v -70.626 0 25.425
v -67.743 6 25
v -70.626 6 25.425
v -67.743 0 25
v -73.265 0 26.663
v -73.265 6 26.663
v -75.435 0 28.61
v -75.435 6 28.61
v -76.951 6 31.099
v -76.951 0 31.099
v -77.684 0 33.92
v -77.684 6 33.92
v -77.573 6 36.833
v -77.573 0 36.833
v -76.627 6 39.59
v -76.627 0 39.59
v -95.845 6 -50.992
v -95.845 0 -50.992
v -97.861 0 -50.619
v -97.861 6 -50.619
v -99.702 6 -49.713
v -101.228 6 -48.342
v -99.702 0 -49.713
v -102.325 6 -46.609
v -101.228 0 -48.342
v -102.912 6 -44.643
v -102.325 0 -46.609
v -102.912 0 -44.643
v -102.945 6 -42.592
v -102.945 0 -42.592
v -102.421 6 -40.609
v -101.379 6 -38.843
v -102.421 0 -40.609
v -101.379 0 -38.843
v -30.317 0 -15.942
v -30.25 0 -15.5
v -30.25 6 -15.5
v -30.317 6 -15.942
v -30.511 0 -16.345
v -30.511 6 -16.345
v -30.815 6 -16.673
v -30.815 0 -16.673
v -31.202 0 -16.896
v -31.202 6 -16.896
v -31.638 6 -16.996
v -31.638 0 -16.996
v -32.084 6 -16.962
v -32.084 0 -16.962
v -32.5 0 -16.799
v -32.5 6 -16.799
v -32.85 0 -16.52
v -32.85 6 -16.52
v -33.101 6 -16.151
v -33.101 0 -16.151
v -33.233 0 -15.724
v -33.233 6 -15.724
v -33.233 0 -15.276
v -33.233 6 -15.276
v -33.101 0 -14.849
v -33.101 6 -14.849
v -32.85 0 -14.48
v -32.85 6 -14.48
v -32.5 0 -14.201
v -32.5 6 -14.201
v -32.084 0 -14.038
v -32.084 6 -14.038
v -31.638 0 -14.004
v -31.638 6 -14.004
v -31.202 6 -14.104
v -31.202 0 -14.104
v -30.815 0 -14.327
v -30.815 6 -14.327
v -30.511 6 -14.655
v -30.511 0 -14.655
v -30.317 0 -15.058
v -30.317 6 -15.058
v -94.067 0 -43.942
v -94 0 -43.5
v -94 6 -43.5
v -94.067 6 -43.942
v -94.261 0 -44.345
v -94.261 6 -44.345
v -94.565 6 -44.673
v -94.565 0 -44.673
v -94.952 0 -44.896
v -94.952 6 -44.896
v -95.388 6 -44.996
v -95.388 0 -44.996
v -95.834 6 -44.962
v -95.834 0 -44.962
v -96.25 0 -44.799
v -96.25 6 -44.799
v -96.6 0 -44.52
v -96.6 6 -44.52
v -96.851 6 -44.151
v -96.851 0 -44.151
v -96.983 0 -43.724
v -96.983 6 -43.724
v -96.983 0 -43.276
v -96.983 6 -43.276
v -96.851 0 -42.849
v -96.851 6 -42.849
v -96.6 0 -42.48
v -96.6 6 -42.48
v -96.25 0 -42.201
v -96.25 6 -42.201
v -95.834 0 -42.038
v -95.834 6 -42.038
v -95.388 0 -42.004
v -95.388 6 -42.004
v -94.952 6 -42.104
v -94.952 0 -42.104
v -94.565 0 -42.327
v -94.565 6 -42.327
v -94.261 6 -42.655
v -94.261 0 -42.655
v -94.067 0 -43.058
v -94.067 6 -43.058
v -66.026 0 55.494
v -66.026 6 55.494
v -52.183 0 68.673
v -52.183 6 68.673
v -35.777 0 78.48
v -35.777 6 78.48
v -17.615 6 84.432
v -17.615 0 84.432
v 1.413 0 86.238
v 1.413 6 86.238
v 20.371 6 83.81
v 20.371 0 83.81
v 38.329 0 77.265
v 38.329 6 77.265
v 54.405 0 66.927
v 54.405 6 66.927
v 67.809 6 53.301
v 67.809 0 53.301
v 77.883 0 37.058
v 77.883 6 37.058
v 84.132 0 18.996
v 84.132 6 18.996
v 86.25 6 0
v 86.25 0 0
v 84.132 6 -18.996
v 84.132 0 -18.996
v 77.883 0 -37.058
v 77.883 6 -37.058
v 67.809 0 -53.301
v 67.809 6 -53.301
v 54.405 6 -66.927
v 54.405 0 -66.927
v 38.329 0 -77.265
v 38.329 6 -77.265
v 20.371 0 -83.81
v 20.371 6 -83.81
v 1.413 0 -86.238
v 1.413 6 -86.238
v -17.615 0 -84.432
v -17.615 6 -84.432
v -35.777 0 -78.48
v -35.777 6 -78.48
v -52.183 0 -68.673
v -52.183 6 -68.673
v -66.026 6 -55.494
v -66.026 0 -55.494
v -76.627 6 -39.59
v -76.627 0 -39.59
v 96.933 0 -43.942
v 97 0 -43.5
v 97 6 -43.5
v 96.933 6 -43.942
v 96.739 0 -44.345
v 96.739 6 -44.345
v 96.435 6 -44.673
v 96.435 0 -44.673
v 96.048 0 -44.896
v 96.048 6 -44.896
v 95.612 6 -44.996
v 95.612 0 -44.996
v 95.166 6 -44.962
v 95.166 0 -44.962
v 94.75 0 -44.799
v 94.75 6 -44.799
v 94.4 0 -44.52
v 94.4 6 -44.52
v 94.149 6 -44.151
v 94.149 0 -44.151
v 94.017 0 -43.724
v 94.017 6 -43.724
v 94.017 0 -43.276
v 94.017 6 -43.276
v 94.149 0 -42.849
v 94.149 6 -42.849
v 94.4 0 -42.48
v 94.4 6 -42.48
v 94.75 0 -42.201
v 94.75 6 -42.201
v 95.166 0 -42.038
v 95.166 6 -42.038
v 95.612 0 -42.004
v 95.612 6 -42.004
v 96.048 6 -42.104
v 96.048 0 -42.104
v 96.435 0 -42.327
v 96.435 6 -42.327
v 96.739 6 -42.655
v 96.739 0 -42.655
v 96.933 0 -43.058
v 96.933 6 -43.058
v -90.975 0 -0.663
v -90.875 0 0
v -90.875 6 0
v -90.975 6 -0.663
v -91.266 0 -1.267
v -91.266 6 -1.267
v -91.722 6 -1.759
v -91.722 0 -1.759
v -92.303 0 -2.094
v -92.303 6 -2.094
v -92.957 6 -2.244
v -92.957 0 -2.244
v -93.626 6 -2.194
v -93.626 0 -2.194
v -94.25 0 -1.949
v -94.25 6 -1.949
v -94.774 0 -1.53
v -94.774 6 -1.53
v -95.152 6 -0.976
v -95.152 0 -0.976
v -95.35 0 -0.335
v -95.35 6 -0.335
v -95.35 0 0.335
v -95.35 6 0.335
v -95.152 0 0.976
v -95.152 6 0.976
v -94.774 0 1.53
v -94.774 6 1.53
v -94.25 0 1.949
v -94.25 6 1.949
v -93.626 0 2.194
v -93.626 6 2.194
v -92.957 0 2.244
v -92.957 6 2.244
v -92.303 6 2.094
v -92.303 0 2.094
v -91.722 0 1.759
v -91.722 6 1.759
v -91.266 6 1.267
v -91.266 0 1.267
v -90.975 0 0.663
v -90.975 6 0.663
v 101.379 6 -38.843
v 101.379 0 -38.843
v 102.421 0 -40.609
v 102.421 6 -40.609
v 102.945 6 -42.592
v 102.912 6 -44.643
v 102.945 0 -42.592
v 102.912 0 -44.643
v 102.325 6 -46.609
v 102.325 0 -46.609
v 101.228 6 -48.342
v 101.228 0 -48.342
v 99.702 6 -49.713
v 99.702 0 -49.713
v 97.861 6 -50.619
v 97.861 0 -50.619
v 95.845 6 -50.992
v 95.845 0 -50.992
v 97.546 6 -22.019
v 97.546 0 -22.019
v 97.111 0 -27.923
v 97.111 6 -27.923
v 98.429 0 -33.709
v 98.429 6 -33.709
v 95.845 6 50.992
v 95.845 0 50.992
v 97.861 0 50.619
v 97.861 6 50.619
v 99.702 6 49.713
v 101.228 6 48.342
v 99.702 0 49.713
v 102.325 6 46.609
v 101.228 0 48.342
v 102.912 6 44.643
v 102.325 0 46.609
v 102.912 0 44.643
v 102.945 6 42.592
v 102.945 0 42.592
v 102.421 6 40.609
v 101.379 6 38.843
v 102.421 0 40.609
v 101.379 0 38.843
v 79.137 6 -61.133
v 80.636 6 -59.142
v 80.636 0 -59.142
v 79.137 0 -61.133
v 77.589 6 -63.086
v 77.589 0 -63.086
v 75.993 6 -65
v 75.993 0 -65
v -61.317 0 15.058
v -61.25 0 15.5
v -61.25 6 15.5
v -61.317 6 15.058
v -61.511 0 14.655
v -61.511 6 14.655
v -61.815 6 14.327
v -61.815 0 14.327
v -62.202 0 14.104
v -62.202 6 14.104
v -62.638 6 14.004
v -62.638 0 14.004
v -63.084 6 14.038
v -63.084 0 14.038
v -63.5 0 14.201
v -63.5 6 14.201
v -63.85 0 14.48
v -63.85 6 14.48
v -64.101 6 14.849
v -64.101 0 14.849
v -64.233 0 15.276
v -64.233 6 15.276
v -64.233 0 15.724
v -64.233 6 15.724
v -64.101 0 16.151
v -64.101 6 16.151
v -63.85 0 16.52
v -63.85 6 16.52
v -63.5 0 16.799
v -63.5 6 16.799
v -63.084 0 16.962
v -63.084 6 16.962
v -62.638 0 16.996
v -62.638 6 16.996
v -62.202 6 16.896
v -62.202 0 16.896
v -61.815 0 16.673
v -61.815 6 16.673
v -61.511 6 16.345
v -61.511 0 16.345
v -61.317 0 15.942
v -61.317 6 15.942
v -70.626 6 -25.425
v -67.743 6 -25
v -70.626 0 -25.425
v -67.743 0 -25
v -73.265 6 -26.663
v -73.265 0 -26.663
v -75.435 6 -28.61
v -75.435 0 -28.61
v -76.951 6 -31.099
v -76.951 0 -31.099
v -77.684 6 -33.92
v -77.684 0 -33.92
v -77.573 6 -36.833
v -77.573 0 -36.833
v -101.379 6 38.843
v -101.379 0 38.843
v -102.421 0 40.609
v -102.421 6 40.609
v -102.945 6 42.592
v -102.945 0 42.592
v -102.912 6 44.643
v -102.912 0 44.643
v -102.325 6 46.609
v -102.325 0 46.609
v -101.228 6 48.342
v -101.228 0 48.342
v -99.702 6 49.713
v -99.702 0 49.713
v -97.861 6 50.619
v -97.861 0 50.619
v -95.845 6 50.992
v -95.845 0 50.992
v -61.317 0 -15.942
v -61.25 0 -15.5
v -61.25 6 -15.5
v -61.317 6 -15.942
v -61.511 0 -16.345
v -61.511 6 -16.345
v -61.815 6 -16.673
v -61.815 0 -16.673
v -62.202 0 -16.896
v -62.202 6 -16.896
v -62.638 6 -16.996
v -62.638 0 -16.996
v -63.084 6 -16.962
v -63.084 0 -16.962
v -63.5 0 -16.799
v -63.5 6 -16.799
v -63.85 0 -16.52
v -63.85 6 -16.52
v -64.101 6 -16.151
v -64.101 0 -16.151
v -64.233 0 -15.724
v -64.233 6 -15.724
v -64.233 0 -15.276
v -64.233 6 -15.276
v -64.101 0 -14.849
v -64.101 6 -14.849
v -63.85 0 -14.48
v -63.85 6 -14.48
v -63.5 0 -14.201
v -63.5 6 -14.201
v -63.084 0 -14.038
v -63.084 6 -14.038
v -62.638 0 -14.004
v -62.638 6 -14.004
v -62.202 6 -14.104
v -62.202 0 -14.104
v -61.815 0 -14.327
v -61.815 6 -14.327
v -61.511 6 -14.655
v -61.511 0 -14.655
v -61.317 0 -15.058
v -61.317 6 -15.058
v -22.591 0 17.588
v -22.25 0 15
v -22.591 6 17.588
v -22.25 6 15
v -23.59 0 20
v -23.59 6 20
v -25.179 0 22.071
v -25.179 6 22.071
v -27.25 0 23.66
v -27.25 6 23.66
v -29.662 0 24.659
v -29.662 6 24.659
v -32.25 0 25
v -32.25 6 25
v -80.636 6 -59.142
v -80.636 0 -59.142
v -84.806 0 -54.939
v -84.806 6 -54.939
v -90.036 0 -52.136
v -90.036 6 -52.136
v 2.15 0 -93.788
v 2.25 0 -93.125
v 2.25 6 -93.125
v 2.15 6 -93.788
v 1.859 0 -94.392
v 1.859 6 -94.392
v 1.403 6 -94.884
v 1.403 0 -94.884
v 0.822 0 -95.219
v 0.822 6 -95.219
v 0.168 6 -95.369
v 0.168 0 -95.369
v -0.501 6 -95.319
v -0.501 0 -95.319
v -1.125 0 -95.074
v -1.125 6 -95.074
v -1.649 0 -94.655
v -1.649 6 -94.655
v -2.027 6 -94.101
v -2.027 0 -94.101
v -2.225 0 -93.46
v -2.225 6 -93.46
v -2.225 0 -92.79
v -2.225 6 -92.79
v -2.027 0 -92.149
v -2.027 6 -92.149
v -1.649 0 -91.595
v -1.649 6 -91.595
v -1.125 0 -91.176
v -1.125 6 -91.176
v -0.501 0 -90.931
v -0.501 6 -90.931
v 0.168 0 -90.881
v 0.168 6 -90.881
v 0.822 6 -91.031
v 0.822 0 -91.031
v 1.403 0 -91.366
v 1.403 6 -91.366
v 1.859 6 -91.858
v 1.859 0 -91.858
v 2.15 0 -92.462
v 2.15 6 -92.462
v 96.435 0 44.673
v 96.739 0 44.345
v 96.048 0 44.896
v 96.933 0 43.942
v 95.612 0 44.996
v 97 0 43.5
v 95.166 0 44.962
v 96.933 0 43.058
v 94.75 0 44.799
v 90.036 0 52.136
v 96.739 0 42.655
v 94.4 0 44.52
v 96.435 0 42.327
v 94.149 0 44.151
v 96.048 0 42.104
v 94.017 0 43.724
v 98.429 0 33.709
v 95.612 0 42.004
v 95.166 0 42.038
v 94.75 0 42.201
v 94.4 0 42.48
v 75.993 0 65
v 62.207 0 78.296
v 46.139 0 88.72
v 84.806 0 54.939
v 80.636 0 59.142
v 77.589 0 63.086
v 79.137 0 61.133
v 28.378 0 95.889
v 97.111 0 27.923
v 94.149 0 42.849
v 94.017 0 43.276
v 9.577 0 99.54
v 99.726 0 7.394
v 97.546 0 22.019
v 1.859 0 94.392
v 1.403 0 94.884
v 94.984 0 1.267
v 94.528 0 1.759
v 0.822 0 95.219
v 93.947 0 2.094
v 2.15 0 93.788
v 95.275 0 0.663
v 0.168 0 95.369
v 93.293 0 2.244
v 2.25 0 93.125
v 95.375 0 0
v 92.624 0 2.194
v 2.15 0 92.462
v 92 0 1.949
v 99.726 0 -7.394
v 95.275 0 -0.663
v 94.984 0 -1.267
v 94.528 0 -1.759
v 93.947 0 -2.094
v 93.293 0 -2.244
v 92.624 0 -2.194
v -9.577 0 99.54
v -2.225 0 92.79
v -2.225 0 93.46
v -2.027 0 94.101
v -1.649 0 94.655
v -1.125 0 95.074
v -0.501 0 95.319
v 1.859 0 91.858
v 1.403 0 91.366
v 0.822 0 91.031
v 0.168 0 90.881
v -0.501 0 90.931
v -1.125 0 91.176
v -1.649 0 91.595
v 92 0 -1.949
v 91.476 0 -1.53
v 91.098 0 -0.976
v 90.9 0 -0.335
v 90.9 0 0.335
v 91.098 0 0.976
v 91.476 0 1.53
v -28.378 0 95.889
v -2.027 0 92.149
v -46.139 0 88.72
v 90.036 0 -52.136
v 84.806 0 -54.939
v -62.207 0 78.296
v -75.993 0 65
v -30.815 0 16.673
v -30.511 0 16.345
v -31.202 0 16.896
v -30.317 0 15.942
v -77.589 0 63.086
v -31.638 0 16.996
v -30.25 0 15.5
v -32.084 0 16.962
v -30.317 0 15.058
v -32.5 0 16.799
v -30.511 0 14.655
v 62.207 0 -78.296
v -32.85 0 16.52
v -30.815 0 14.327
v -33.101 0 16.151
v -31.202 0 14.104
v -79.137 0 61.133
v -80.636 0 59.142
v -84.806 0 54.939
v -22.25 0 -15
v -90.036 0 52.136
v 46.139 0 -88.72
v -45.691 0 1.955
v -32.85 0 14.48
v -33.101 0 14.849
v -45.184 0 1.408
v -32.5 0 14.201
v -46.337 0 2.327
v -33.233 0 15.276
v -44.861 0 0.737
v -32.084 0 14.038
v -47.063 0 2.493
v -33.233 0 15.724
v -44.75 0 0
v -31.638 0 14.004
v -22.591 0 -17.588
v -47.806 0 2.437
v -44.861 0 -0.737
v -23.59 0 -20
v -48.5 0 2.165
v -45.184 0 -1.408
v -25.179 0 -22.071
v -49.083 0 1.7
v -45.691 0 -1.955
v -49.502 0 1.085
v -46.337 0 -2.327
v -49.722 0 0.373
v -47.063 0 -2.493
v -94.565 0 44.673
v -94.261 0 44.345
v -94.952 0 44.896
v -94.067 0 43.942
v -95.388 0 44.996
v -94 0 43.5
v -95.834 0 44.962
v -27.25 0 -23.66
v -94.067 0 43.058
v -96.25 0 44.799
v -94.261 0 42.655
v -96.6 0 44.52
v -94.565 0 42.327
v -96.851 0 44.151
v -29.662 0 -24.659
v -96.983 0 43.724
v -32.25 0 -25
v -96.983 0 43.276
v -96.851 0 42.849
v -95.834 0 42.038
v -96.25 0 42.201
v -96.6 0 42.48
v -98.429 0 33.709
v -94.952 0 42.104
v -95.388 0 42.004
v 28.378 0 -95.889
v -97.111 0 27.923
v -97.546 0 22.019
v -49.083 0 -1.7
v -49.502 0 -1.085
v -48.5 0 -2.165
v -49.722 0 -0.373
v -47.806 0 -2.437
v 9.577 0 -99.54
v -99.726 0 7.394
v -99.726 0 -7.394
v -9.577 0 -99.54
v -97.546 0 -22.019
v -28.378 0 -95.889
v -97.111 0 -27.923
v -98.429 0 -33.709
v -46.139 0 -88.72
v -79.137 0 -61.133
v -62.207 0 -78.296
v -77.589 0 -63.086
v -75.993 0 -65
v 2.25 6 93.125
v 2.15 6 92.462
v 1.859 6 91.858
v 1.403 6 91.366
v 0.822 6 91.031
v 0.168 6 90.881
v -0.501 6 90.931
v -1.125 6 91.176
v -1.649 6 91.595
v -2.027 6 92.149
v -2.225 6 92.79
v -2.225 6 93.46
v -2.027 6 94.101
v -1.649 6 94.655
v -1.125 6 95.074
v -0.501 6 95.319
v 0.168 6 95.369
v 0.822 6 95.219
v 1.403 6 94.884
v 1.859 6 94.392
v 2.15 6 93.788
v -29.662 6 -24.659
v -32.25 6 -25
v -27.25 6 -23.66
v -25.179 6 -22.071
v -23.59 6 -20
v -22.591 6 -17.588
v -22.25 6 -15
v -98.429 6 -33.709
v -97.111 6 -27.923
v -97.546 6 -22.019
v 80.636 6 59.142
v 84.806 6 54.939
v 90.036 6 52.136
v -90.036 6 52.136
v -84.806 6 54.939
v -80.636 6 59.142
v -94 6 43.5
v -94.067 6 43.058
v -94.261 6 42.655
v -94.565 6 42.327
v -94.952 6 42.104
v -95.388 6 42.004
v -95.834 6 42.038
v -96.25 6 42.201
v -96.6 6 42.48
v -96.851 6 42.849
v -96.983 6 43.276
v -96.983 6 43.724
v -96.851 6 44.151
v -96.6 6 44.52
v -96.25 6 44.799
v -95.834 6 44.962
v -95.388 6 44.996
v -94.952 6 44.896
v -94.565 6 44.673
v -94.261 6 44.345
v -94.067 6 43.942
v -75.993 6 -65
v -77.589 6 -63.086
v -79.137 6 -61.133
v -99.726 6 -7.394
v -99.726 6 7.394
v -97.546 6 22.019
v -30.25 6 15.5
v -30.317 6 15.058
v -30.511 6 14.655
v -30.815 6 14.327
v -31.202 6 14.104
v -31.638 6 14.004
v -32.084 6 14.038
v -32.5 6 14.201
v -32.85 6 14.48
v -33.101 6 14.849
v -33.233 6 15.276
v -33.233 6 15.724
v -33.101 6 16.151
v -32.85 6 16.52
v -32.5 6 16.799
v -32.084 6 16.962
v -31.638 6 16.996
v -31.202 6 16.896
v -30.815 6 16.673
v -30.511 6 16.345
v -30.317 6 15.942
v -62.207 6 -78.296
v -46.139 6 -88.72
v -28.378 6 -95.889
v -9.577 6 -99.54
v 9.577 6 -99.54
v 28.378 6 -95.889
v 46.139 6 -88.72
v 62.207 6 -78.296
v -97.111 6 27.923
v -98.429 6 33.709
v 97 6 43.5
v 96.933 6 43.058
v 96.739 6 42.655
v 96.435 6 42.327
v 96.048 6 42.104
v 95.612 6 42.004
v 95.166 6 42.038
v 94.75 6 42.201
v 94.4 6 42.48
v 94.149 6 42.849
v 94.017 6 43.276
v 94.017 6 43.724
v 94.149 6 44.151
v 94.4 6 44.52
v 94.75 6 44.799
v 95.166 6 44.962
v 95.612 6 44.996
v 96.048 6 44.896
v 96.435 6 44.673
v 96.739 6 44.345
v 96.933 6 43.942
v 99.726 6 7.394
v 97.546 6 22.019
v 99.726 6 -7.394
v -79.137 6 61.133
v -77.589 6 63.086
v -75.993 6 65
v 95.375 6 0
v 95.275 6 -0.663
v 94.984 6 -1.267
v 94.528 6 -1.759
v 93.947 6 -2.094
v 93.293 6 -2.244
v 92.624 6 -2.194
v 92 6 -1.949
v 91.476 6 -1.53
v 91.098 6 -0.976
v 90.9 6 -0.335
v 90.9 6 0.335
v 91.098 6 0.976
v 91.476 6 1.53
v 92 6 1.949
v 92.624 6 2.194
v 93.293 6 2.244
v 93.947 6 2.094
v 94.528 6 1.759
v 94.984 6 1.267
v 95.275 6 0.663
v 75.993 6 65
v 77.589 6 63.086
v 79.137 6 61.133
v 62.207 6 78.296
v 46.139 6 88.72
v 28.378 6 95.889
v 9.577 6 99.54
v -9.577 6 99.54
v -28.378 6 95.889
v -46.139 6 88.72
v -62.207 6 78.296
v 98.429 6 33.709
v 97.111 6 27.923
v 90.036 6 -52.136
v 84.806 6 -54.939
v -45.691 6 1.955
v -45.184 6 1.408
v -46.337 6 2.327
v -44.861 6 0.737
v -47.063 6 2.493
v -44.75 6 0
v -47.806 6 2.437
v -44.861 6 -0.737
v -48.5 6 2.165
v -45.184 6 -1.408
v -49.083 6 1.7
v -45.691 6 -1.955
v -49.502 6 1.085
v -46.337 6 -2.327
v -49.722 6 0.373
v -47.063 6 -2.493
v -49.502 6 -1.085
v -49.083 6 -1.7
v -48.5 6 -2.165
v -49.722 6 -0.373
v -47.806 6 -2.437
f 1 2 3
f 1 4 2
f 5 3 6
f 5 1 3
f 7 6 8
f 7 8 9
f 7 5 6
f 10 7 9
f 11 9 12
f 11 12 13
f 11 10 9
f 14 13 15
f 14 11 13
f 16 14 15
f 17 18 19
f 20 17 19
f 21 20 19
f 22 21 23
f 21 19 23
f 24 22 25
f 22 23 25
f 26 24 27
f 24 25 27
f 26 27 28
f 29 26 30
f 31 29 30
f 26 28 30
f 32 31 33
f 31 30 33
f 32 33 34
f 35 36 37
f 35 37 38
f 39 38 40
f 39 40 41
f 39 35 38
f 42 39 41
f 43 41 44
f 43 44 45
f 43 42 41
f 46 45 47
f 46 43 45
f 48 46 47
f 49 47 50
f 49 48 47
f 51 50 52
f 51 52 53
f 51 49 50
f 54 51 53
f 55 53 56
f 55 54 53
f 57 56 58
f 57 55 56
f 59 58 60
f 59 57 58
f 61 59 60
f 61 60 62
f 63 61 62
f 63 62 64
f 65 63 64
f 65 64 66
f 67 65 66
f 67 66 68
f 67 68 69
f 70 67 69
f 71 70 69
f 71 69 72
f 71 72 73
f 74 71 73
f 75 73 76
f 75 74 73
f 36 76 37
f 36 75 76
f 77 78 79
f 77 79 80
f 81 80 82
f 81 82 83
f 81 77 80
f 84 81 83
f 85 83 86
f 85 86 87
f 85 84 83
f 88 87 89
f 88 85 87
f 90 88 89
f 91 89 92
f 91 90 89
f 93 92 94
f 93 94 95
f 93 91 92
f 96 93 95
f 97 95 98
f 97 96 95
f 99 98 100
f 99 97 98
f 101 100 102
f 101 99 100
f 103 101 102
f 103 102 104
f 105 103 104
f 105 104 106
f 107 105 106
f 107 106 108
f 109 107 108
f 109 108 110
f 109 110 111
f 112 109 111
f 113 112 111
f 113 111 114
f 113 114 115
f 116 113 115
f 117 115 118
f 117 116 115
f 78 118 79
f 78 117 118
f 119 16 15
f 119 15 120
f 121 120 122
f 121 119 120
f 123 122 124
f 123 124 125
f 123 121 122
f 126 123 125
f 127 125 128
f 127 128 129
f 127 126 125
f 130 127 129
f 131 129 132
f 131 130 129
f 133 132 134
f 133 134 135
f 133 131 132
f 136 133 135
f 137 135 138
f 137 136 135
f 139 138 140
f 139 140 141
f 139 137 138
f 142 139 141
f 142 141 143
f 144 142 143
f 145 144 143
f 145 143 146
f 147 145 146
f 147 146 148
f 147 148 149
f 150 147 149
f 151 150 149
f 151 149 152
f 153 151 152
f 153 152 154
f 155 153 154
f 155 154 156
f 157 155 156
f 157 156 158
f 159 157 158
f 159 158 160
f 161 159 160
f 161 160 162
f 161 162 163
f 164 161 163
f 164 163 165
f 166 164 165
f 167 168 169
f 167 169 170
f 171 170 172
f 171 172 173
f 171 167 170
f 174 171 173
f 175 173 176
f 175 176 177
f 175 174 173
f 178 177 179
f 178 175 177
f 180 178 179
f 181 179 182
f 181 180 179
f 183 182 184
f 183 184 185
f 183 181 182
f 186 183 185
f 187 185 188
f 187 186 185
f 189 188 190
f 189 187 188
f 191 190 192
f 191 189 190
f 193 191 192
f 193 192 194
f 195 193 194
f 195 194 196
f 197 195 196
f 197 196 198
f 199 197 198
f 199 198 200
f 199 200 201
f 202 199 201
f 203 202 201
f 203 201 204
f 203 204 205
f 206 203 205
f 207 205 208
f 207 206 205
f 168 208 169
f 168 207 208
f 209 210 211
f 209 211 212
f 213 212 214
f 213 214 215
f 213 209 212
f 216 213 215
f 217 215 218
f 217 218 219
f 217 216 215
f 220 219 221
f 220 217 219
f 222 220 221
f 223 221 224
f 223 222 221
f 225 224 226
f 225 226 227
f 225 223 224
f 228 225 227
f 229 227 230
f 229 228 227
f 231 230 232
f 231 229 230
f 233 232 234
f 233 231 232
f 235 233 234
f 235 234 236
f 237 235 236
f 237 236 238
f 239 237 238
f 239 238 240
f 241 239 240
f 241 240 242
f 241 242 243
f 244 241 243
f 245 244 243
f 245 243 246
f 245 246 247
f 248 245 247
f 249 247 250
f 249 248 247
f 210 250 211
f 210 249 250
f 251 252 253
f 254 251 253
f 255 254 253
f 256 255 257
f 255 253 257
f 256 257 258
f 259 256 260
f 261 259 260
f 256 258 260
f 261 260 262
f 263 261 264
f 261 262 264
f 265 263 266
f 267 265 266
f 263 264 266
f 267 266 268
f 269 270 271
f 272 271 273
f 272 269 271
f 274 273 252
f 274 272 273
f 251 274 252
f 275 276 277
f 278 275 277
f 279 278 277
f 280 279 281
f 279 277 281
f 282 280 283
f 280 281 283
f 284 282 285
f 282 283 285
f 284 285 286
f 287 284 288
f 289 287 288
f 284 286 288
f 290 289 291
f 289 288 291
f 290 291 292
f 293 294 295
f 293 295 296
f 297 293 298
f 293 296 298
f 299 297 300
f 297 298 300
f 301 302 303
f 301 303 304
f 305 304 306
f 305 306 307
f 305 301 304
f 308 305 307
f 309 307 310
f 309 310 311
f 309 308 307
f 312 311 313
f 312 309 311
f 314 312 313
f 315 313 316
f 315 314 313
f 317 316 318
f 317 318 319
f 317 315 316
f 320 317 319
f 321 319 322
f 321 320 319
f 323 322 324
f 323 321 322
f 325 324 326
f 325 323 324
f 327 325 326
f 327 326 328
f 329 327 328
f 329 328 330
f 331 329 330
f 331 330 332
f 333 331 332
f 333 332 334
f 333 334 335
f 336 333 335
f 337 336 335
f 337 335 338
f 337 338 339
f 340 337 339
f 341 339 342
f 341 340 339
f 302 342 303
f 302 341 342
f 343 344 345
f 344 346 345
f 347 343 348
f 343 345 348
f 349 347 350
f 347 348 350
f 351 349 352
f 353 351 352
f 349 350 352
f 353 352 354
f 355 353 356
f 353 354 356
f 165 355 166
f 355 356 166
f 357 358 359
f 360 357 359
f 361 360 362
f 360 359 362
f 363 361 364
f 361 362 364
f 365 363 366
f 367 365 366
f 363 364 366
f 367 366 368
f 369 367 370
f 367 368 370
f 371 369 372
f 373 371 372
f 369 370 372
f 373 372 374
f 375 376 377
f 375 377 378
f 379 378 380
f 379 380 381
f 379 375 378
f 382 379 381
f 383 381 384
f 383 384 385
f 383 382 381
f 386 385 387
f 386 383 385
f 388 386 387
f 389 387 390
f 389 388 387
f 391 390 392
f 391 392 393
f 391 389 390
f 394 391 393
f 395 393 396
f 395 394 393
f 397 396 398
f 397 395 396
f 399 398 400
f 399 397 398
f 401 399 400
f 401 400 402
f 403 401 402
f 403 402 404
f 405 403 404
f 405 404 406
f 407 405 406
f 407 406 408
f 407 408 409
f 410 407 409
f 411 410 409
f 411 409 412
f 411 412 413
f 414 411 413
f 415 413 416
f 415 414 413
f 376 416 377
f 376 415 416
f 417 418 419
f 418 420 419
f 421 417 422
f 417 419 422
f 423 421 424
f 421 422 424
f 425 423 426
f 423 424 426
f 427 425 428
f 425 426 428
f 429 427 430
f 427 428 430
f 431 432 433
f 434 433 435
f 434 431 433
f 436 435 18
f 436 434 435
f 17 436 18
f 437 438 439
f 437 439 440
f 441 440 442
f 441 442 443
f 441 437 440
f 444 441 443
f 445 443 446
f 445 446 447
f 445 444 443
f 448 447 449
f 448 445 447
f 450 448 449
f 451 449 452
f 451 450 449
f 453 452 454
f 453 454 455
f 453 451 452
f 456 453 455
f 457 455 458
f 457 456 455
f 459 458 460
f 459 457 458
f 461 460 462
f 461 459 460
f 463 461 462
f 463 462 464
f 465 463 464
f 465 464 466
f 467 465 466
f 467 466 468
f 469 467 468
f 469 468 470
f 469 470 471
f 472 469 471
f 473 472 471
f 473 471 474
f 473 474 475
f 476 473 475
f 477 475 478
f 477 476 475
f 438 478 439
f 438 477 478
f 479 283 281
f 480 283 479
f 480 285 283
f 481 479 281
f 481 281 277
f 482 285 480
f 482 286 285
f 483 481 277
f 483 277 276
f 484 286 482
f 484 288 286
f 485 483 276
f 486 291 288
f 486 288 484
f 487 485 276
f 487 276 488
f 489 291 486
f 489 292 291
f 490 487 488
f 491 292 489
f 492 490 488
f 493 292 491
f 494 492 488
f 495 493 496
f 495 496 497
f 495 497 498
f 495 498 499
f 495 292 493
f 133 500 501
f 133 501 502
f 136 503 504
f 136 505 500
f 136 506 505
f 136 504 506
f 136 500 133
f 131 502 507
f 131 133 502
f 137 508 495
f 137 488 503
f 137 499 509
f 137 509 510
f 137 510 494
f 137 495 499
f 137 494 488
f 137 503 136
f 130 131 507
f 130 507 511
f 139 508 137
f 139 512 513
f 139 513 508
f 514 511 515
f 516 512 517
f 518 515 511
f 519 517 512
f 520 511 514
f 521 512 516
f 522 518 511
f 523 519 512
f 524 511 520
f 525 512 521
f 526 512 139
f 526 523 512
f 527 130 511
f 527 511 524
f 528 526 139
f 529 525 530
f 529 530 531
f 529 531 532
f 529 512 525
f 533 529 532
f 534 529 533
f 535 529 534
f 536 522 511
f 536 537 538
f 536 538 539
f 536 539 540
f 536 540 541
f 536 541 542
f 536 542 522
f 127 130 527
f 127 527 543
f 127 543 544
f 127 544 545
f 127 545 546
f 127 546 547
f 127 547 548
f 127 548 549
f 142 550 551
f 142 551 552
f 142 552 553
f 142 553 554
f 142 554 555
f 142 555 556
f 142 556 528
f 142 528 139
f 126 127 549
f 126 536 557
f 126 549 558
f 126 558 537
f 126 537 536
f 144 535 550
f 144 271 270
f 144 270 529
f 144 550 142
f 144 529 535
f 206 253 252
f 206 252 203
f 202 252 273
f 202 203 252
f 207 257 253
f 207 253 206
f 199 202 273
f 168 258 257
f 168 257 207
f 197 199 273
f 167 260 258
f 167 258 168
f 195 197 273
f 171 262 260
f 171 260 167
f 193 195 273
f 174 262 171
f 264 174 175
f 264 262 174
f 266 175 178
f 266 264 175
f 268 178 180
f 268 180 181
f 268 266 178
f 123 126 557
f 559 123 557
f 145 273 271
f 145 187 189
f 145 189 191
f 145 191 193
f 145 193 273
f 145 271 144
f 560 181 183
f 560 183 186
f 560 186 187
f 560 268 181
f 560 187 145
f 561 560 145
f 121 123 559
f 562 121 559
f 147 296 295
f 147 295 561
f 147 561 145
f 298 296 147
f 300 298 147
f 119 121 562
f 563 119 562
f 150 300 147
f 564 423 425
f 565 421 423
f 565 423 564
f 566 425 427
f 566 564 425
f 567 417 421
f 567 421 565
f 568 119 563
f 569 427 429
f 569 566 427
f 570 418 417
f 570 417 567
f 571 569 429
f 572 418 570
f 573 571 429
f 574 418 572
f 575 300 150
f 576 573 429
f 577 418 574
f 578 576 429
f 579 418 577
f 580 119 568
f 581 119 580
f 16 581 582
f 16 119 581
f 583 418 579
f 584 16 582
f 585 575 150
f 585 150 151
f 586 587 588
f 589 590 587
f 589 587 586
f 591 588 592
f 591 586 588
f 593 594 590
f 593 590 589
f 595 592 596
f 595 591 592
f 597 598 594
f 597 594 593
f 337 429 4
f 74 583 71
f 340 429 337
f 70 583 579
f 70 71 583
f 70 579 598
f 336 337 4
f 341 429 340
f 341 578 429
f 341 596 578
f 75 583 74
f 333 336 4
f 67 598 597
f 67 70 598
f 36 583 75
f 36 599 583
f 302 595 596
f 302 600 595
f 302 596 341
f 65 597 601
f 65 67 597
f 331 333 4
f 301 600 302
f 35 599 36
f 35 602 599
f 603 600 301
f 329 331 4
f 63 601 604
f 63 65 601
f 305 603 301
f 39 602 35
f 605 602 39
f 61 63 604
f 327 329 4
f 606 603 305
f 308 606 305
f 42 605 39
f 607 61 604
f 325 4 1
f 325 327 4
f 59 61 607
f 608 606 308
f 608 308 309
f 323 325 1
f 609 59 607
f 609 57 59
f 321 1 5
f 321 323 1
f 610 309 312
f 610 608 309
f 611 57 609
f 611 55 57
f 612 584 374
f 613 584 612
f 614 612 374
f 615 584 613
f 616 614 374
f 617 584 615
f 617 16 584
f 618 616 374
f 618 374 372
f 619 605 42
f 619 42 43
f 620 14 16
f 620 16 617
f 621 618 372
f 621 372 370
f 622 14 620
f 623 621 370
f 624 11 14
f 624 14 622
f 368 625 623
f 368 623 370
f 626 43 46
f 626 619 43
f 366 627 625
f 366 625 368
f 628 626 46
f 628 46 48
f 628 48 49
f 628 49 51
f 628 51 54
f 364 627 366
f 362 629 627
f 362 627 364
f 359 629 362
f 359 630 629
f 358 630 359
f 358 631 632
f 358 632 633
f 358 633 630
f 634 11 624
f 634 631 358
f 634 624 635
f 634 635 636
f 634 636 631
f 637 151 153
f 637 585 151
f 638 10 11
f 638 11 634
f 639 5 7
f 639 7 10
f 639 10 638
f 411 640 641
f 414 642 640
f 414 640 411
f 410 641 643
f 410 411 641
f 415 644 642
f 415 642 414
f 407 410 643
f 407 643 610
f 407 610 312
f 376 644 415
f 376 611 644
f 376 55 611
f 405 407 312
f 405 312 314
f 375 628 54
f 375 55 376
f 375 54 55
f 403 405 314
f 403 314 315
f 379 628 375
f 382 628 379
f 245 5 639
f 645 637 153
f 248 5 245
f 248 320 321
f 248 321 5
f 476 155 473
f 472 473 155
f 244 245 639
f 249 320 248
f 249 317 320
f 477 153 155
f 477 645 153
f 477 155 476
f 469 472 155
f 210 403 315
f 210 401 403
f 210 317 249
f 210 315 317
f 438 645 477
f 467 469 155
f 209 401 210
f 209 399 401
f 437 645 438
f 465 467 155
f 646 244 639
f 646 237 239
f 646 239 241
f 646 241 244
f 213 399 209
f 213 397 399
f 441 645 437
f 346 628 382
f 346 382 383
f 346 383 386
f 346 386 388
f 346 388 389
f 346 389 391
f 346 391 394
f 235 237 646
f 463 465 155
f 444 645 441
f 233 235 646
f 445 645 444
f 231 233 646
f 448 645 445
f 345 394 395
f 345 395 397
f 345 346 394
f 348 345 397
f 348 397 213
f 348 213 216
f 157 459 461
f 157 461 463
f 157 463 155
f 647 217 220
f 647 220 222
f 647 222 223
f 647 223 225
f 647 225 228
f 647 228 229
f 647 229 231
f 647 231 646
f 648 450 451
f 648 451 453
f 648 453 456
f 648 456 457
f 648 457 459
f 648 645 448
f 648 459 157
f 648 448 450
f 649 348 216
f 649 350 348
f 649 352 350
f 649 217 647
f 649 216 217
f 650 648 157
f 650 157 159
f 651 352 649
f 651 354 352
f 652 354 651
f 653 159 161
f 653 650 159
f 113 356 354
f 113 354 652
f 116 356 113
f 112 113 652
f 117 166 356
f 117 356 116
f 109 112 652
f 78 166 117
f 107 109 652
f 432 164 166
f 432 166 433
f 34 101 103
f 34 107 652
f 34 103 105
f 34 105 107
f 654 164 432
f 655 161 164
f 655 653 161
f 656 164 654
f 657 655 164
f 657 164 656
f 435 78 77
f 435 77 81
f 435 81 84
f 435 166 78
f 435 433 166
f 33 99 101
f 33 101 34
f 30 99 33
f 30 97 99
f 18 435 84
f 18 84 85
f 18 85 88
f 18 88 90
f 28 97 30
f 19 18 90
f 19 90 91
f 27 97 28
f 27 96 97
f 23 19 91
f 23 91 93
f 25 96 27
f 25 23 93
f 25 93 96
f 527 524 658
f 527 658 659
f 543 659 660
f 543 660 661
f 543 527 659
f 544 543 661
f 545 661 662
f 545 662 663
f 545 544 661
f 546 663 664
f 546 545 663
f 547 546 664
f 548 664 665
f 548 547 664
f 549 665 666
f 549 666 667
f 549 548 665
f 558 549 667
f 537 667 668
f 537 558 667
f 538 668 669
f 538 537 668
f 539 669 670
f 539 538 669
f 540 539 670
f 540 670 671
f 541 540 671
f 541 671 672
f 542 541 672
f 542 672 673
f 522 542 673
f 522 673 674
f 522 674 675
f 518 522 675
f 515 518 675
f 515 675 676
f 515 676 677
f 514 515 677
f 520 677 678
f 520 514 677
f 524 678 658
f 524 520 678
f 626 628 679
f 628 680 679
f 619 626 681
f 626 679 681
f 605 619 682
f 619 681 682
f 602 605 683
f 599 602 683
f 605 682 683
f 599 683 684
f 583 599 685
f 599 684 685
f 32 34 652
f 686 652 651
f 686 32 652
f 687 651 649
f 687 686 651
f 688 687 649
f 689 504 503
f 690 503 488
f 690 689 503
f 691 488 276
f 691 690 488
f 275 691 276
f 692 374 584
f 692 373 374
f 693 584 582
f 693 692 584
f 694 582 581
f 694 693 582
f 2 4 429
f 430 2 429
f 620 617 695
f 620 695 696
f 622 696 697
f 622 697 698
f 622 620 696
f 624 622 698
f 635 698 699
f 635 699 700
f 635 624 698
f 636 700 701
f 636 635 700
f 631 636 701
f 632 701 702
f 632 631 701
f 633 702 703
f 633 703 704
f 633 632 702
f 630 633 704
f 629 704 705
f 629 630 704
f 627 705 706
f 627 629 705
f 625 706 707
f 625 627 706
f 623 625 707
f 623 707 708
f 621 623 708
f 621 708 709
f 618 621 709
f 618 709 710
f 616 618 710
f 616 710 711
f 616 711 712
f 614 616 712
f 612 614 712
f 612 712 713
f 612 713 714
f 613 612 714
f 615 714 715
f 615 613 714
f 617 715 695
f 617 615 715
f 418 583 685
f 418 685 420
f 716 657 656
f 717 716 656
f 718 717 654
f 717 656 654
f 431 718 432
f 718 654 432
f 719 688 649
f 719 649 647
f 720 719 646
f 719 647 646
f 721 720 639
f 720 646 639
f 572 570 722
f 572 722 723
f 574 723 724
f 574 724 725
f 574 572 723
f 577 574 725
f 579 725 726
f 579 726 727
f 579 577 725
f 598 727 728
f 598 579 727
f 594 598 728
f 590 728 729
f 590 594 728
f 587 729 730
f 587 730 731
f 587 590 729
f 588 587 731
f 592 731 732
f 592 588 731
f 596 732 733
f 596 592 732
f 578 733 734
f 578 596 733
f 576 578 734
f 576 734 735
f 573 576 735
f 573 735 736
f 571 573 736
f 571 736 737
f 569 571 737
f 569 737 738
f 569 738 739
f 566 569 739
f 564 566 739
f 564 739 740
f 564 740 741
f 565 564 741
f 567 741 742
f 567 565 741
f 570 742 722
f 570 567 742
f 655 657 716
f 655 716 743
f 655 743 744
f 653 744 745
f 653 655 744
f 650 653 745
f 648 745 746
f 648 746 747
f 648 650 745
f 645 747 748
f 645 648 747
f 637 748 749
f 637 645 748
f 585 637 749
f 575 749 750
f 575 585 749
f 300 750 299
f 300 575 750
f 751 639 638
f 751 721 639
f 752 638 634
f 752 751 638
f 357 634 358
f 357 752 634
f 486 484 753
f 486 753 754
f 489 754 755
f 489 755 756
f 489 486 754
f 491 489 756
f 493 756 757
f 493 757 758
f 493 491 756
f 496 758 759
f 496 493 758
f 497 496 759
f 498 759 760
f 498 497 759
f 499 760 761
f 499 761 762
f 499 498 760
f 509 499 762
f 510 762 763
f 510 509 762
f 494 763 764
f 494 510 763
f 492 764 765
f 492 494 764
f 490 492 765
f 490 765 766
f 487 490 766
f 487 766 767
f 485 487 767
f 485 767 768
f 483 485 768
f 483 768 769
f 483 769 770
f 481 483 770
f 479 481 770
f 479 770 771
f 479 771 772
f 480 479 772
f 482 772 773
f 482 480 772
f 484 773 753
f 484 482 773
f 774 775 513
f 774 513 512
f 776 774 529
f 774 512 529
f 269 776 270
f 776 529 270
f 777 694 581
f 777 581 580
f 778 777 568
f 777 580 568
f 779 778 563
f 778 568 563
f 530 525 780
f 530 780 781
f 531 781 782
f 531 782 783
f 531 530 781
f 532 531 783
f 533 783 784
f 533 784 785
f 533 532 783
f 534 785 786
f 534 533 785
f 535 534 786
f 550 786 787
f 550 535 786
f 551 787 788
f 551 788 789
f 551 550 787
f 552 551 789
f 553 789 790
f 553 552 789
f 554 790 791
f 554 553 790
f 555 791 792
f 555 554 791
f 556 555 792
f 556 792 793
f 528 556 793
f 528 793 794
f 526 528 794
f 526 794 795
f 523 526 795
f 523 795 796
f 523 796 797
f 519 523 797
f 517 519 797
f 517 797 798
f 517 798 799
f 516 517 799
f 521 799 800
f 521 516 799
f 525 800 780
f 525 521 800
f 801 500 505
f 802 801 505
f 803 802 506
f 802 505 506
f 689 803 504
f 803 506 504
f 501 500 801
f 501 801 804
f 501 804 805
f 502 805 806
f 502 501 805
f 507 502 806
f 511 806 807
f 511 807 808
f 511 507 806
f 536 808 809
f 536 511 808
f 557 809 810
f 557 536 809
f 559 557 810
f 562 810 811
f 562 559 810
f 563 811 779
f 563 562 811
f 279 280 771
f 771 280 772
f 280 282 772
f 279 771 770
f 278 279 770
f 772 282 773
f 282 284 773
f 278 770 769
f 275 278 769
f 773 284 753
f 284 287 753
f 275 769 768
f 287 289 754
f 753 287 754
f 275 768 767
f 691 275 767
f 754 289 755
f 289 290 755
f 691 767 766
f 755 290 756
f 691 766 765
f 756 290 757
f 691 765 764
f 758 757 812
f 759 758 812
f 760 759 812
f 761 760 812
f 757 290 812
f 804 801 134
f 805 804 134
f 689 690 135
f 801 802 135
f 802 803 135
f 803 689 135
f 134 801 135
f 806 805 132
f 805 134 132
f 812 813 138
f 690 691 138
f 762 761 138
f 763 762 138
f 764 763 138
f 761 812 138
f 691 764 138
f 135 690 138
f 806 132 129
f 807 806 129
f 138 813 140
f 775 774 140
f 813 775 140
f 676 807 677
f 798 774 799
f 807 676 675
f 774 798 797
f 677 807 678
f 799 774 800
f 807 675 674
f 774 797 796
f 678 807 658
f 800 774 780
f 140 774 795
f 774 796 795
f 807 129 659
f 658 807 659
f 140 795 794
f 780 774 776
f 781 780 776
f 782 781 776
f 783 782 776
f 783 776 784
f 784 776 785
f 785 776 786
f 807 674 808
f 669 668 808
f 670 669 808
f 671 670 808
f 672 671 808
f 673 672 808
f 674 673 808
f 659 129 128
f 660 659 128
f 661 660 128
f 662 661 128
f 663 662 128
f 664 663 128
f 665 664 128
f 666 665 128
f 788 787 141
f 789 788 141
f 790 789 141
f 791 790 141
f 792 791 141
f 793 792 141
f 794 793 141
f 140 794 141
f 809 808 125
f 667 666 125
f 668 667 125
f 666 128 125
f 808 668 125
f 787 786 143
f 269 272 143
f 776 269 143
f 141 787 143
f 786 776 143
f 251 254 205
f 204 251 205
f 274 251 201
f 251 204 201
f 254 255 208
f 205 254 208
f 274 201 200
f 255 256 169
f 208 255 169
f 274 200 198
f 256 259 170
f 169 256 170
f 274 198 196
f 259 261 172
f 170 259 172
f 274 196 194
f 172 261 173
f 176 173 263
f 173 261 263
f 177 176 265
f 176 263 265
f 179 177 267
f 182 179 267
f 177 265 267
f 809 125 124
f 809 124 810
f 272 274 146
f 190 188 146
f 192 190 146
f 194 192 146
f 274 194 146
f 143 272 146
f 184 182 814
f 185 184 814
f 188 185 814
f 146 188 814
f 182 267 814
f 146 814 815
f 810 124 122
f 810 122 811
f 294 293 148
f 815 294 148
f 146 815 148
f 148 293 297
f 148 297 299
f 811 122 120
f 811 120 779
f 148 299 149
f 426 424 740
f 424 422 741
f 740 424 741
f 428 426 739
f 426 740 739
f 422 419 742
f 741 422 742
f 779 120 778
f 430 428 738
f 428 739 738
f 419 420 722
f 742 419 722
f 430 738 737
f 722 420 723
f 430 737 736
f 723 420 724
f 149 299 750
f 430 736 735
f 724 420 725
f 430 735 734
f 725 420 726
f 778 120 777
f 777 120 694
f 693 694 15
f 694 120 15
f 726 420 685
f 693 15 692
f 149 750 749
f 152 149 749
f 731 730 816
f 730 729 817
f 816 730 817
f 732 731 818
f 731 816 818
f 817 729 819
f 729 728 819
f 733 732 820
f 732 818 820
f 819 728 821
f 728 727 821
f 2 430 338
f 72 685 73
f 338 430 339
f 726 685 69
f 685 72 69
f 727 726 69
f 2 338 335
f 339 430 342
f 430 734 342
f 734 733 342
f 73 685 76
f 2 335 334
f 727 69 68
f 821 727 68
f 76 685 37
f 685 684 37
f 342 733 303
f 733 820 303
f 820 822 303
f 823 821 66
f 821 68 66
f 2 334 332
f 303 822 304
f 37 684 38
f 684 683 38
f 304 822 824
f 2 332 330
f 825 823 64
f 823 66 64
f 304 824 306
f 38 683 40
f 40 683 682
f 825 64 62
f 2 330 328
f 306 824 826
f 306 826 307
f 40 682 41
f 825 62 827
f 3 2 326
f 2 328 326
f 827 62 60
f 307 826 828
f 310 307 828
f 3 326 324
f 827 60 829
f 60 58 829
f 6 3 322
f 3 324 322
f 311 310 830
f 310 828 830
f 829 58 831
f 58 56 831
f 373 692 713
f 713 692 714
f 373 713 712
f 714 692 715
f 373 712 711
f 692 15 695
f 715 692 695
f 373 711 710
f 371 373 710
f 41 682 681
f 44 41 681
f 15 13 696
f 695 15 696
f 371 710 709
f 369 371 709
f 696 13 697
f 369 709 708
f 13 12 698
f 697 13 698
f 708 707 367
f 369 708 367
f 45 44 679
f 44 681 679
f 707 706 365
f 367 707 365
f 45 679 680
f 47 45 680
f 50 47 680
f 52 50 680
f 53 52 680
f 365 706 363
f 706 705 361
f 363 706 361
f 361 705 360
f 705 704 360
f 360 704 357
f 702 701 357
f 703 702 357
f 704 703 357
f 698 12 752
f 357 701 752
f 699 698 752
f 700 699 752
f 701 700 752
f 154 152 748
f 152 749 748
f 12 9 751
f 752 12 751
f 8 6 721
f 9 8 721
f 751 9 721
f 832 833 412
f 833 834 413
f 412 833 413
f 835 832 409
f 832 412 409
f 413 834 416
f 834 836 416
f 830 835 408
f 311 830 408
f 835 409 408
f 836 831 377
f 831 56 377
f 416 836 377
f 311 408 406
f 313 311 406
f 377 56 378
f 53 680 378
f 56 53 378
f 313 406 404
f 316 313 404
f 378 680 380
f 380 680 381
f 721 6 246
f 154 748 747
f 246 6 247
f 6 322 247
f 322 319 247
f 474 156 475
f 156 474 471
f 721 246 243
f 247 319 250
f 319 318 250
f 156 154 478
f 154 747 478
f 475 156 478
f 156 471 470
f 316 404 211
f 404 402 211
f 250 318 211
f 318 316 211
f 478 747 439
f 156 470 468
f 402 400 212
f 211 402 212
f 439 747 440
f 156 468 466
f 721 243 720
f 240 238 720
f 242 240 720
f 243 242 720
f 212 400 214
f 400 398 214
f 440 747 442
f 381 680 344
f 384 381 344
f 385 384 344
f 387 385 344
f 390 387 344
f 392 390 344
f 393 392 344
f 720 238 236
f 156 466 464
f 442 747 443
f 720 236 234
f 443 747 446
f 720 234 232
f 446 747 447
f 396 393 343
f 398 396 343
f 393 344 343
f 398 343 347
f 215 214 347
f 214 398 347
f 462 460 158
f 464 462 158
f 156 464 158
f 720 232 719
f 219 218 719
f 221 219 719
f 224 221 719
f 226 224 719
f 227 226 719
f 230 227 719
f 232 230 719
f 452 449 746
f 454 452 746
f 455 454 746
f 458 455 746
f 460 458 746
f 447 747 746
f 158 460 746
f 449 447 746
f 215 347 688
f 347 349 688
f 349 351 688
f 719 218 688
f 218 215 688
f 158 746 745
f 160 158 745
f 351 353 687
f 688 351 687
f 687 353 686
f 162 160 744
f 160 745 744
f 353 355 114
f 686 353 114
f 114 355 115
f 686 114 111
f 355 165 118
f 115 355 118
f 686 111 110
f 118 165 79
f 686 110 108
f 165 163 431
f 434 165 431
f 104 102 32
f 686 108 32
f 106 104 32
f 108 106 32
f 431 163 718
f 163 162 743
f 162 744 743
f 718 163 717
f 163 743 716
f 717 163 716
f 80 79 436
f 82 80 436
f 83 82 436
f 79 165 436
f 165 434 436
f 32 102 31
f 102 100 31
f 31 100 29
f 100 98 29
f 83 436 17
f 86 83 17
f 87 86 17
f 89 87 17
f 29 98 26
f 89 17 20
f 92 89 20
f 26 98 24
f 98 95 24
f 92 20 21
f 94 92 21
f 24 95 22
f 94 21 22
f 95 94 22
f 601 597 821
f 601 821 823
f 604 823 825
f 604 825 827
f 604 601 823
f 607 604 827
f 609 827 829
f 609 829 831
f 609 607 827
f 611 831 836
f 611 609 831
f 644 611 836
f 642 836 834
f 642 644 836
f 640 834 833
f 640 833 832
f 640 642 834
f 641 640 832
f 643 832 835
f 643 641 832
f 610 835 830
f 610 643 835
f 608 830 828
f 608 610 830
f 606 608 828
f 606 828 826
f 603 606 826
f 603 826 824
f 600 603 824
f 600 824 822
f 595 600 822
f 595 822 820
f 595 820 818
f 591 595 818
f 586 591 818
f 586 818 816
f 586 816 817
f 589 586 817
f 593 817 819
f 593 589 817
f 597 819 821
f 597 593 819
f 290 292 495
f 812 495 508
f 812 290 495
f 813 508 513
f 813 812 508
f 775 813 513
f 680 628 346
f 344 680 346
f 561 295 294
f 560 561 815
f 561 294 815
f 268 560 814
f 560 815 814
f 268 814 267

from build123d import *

# Parameters (mm, degrees)
SKETCH1_R           = 86.25
BOSS_EXTRUDE1_DEPTH = 6
SKETCH2_R           = 1.5
CUT_EXTRUDE1_DEPTH  = 6
SKETCH3_R           = 2.25
CUT_EXTRUDE2_DEPTH  = 6
CUT_EXTRUDE3_DEPTH  = 6
FILLET1_R           = 20
SKETCH5_R           = 2.5
SKETCH5_R_2         = 1.5
BOSS_EXTRUDE2_DEPTH = 6
FILLET2_R           = 10


with BuildPart() as part:
    # Sketch1 → Boss-Extrude1 (new body)
    with BuildSketch(Plane(origin=(0, 0, 0), x_dir=(1, 0, 0), z_dir=(0, 1, 0))):
        with BuildLine():
            Line((75.993420768, 65), (110, 65))
            Line((110, 65), (110, -65))
            Line((110, -65), (75.993420768, -65))
            ThreePointArc((75.993420768, -65), (0, -100), (-75.993420768, -65))
            Line((-75.993420768, -65), (-110, -65))
            Line((-110, -65), (-110, 65))
            Line((-110, 65), (-75.993420768, 65))
            ThreePointArc((-75.993420768, 65), (0, 100), (75.993420768, 65))
        make_face()
        Circle(SKETCH1_R, mode=Mode.SUBTRACT)
    extrude(amount=BOSS_EXTRUDE1_DEPTH)

    # Sketch2 → Cut-Extrude1 (cut)
    with BuildSketch(Plane(origin=(0, 0, 0), x_dir=(1, 0, 0), z_dir=(0, 1, 0))):
        with Locations((-95.5, 43.5)):
            Circle(SKETCH2_R)
        with Locations((95.5, 43.5)):
            Circle(SKETCH2_R)
        with Locations((95.5, -43.5)):
            Circle(SKETCH2_R)
        with Locations((-95.5, -43.5)):
            Circle(SKETCH2_R)
    extrude(amount=CUT_EXTRUDE1_DEPTH, mode=Mode.SUBTRACT)

    # Sketch3 → Cut-Extrude2 (cut)
    with BuildSketch(Plane(origin=(0, 0, 0), x_dir=(1, 0, 0), z_dir=(0, 1, 0))):
        with Locations((0, 93.125)):
            Circle(SKETCH3_R)
        with Locations((93.125, 0)):
            Circle(SKETCH3_R)
        with Locations((0, -93.125)):
            Circle(SKETCH3_R)
        with Locations((-93.125, 0)):
            Circle(SKETCH3_R)
    extrude(amount=CUT_EXTRUDE2_DEPTH, mode=Mode.SUBTRACT)

    # Sketch4 → Cut-Extrude3 (cut)
    with BuildSketch(Plane(origin=(0, 0, 0), x_dir=(1, 0, 0), z_dir=(0, 1, 0))):
        with BuildLine():
            Line((98.608905775, -36.674701114), (93.856581268, -34.510029742))
            ThreePointArc((93.856581268, -34.510029742), (100, 0), (93.856581268, 34.510029742))
            Line((93.856581268, 34.510029742), (98.608905775, 36.674701114))
            ThreePointArc((98.608905775, 36.674701114), (102.325298886, 46.608905775), (92.391094225, 50.325298886))
            Line((92.391094225, 50.325298886), (87.638769717, 48.160627513))
            ThreePointArc((87.638769717, 48.160627513), (82.248188777, 56.879130117), (75.993420768, 65))
            Line((75.993420768, 65), (110, 65))
            Line((110, 65), (110, -65))
            Line((110, -65), (75.993420768, -65))
            ThreePointArc((75.993420768, -65), (82.248188777, -56.879130117), (87.638769717, -48.160627513))
            Line((87.638769717, -48.160627513), (92.391094225, -50.325298886))
            ThreePointArc((92.391094225, -50.325298886), (102.325298886, -46.608905775), (98.608905775, -36.674701114))
        make_face()
        with BuildLine():
            Line((-98.608905775, 36.674701114), (-93.856581268, 34.510029742))
            ThreePointArc((-93.856581268, 34.510029742), (-100, 0), (-93.856581268, -34.510029742))
            Line((-93.856581268, -34.510029742), (-98.608905775, -36.674701114))
            ThreePointArc((-98.608905775, -36.674701114), (-102.325298886, -46.608905775), (-92.391094225, -50.325298886))
            Line((-92.391094225, -50.325298886), (-87.638769717, -48.160627513))
            ThreePointArc((-87.638769717, -48.160627513), (-82.248188777, -56.879130117), (-75.993420768, -65))
            Line((-75.993420768, -65), (-110, -65))
            Line((-110, -65), (-110, 65))
            Line((-110, 65), (-75.993420768, 65))
            ThreePointArc((-75.993420768, 65), (-82.248188777, 56.879130117), (-87.638769717, 48.160627513))
            Line((-87.638769717, 48.160627513), (-92.391094225, 50.325298886))
            ThreePointArc((-92.391094225, 50.325298886), (-102.325298886, 46.608905775), (-98.608905775, 36.674701114))
        make_face()
    extrude(amount=CUT_EXTRUDE3_DEPTH, mode=Mode.SUBTRACT)

    # Fillet1
    fillet1_edges = [part.edges().sort_by_distance(p)[0] for p in [
        (87.638769717, 3, -48.160627513),
        (93.856581268, 3, -34.510029742),
        (93.856581268, 3, 34.510029742),
        (87.638769717, 3, 48.160627513),
        (-87.638769717, 3, 48.160627513),
        (-93.856581268, 3, 34.510029742),
        (-93.856581268, 3, -34.510029742),
        (-87.638769717, 3, -48.160627513),
    ]]
    fillet(fillet1_edges, radius=FILLET1_R)

    # Sketch5 → Boss-Extrude2 (add)
    with BuildSketch(Plane(origin=(0, 0, 0), x_dir=(1, 0, 0), z_dir=(0, 1, 0))):
        Polygon((-72.25, 25), (-22.25, 25), (-22.25, -25), (-72.25, -25), (-87.689436508, -25), (-87.689436508, 25), align=None)
        with Locations((-47.25, 0)):
            Circle(SKETCH5_R, mode=Mode.SUBTRACT)
        with Locations((-62.75, 15.5)):
            Circle(SKETCH5_R_2, mode=Mode.SUBTRACT)
        with Locations((-31.75, 15.5)):
            Circle(SKETCH5_R_2, mode=Mode.SUBTRACT)
        with Locations((-62.75, -15.5)):
            Circle(SKETCH5_R_2, mode=Mode.SUBTRACT)
        with Locations((-31.75, -15.5)):
            Circle(SKETCH5_R_2, mode=Mode.SUBTRACT)
    extrude(amount=BOSS_EXTRUDE2_DEPTH)

    # Fillet2
    fillet2_edges = [part.edges().sort_by_distance(p)[0] for p in [
        (-82.547334905, 3, 25),
        (-82.547334905, 3, -25),
        (-22.25, 3, 25),
        (-22.25, 3, -25),
    ]]
    fillet(fillet2_edges, radius=FILLET2_R)


solid = part.part
